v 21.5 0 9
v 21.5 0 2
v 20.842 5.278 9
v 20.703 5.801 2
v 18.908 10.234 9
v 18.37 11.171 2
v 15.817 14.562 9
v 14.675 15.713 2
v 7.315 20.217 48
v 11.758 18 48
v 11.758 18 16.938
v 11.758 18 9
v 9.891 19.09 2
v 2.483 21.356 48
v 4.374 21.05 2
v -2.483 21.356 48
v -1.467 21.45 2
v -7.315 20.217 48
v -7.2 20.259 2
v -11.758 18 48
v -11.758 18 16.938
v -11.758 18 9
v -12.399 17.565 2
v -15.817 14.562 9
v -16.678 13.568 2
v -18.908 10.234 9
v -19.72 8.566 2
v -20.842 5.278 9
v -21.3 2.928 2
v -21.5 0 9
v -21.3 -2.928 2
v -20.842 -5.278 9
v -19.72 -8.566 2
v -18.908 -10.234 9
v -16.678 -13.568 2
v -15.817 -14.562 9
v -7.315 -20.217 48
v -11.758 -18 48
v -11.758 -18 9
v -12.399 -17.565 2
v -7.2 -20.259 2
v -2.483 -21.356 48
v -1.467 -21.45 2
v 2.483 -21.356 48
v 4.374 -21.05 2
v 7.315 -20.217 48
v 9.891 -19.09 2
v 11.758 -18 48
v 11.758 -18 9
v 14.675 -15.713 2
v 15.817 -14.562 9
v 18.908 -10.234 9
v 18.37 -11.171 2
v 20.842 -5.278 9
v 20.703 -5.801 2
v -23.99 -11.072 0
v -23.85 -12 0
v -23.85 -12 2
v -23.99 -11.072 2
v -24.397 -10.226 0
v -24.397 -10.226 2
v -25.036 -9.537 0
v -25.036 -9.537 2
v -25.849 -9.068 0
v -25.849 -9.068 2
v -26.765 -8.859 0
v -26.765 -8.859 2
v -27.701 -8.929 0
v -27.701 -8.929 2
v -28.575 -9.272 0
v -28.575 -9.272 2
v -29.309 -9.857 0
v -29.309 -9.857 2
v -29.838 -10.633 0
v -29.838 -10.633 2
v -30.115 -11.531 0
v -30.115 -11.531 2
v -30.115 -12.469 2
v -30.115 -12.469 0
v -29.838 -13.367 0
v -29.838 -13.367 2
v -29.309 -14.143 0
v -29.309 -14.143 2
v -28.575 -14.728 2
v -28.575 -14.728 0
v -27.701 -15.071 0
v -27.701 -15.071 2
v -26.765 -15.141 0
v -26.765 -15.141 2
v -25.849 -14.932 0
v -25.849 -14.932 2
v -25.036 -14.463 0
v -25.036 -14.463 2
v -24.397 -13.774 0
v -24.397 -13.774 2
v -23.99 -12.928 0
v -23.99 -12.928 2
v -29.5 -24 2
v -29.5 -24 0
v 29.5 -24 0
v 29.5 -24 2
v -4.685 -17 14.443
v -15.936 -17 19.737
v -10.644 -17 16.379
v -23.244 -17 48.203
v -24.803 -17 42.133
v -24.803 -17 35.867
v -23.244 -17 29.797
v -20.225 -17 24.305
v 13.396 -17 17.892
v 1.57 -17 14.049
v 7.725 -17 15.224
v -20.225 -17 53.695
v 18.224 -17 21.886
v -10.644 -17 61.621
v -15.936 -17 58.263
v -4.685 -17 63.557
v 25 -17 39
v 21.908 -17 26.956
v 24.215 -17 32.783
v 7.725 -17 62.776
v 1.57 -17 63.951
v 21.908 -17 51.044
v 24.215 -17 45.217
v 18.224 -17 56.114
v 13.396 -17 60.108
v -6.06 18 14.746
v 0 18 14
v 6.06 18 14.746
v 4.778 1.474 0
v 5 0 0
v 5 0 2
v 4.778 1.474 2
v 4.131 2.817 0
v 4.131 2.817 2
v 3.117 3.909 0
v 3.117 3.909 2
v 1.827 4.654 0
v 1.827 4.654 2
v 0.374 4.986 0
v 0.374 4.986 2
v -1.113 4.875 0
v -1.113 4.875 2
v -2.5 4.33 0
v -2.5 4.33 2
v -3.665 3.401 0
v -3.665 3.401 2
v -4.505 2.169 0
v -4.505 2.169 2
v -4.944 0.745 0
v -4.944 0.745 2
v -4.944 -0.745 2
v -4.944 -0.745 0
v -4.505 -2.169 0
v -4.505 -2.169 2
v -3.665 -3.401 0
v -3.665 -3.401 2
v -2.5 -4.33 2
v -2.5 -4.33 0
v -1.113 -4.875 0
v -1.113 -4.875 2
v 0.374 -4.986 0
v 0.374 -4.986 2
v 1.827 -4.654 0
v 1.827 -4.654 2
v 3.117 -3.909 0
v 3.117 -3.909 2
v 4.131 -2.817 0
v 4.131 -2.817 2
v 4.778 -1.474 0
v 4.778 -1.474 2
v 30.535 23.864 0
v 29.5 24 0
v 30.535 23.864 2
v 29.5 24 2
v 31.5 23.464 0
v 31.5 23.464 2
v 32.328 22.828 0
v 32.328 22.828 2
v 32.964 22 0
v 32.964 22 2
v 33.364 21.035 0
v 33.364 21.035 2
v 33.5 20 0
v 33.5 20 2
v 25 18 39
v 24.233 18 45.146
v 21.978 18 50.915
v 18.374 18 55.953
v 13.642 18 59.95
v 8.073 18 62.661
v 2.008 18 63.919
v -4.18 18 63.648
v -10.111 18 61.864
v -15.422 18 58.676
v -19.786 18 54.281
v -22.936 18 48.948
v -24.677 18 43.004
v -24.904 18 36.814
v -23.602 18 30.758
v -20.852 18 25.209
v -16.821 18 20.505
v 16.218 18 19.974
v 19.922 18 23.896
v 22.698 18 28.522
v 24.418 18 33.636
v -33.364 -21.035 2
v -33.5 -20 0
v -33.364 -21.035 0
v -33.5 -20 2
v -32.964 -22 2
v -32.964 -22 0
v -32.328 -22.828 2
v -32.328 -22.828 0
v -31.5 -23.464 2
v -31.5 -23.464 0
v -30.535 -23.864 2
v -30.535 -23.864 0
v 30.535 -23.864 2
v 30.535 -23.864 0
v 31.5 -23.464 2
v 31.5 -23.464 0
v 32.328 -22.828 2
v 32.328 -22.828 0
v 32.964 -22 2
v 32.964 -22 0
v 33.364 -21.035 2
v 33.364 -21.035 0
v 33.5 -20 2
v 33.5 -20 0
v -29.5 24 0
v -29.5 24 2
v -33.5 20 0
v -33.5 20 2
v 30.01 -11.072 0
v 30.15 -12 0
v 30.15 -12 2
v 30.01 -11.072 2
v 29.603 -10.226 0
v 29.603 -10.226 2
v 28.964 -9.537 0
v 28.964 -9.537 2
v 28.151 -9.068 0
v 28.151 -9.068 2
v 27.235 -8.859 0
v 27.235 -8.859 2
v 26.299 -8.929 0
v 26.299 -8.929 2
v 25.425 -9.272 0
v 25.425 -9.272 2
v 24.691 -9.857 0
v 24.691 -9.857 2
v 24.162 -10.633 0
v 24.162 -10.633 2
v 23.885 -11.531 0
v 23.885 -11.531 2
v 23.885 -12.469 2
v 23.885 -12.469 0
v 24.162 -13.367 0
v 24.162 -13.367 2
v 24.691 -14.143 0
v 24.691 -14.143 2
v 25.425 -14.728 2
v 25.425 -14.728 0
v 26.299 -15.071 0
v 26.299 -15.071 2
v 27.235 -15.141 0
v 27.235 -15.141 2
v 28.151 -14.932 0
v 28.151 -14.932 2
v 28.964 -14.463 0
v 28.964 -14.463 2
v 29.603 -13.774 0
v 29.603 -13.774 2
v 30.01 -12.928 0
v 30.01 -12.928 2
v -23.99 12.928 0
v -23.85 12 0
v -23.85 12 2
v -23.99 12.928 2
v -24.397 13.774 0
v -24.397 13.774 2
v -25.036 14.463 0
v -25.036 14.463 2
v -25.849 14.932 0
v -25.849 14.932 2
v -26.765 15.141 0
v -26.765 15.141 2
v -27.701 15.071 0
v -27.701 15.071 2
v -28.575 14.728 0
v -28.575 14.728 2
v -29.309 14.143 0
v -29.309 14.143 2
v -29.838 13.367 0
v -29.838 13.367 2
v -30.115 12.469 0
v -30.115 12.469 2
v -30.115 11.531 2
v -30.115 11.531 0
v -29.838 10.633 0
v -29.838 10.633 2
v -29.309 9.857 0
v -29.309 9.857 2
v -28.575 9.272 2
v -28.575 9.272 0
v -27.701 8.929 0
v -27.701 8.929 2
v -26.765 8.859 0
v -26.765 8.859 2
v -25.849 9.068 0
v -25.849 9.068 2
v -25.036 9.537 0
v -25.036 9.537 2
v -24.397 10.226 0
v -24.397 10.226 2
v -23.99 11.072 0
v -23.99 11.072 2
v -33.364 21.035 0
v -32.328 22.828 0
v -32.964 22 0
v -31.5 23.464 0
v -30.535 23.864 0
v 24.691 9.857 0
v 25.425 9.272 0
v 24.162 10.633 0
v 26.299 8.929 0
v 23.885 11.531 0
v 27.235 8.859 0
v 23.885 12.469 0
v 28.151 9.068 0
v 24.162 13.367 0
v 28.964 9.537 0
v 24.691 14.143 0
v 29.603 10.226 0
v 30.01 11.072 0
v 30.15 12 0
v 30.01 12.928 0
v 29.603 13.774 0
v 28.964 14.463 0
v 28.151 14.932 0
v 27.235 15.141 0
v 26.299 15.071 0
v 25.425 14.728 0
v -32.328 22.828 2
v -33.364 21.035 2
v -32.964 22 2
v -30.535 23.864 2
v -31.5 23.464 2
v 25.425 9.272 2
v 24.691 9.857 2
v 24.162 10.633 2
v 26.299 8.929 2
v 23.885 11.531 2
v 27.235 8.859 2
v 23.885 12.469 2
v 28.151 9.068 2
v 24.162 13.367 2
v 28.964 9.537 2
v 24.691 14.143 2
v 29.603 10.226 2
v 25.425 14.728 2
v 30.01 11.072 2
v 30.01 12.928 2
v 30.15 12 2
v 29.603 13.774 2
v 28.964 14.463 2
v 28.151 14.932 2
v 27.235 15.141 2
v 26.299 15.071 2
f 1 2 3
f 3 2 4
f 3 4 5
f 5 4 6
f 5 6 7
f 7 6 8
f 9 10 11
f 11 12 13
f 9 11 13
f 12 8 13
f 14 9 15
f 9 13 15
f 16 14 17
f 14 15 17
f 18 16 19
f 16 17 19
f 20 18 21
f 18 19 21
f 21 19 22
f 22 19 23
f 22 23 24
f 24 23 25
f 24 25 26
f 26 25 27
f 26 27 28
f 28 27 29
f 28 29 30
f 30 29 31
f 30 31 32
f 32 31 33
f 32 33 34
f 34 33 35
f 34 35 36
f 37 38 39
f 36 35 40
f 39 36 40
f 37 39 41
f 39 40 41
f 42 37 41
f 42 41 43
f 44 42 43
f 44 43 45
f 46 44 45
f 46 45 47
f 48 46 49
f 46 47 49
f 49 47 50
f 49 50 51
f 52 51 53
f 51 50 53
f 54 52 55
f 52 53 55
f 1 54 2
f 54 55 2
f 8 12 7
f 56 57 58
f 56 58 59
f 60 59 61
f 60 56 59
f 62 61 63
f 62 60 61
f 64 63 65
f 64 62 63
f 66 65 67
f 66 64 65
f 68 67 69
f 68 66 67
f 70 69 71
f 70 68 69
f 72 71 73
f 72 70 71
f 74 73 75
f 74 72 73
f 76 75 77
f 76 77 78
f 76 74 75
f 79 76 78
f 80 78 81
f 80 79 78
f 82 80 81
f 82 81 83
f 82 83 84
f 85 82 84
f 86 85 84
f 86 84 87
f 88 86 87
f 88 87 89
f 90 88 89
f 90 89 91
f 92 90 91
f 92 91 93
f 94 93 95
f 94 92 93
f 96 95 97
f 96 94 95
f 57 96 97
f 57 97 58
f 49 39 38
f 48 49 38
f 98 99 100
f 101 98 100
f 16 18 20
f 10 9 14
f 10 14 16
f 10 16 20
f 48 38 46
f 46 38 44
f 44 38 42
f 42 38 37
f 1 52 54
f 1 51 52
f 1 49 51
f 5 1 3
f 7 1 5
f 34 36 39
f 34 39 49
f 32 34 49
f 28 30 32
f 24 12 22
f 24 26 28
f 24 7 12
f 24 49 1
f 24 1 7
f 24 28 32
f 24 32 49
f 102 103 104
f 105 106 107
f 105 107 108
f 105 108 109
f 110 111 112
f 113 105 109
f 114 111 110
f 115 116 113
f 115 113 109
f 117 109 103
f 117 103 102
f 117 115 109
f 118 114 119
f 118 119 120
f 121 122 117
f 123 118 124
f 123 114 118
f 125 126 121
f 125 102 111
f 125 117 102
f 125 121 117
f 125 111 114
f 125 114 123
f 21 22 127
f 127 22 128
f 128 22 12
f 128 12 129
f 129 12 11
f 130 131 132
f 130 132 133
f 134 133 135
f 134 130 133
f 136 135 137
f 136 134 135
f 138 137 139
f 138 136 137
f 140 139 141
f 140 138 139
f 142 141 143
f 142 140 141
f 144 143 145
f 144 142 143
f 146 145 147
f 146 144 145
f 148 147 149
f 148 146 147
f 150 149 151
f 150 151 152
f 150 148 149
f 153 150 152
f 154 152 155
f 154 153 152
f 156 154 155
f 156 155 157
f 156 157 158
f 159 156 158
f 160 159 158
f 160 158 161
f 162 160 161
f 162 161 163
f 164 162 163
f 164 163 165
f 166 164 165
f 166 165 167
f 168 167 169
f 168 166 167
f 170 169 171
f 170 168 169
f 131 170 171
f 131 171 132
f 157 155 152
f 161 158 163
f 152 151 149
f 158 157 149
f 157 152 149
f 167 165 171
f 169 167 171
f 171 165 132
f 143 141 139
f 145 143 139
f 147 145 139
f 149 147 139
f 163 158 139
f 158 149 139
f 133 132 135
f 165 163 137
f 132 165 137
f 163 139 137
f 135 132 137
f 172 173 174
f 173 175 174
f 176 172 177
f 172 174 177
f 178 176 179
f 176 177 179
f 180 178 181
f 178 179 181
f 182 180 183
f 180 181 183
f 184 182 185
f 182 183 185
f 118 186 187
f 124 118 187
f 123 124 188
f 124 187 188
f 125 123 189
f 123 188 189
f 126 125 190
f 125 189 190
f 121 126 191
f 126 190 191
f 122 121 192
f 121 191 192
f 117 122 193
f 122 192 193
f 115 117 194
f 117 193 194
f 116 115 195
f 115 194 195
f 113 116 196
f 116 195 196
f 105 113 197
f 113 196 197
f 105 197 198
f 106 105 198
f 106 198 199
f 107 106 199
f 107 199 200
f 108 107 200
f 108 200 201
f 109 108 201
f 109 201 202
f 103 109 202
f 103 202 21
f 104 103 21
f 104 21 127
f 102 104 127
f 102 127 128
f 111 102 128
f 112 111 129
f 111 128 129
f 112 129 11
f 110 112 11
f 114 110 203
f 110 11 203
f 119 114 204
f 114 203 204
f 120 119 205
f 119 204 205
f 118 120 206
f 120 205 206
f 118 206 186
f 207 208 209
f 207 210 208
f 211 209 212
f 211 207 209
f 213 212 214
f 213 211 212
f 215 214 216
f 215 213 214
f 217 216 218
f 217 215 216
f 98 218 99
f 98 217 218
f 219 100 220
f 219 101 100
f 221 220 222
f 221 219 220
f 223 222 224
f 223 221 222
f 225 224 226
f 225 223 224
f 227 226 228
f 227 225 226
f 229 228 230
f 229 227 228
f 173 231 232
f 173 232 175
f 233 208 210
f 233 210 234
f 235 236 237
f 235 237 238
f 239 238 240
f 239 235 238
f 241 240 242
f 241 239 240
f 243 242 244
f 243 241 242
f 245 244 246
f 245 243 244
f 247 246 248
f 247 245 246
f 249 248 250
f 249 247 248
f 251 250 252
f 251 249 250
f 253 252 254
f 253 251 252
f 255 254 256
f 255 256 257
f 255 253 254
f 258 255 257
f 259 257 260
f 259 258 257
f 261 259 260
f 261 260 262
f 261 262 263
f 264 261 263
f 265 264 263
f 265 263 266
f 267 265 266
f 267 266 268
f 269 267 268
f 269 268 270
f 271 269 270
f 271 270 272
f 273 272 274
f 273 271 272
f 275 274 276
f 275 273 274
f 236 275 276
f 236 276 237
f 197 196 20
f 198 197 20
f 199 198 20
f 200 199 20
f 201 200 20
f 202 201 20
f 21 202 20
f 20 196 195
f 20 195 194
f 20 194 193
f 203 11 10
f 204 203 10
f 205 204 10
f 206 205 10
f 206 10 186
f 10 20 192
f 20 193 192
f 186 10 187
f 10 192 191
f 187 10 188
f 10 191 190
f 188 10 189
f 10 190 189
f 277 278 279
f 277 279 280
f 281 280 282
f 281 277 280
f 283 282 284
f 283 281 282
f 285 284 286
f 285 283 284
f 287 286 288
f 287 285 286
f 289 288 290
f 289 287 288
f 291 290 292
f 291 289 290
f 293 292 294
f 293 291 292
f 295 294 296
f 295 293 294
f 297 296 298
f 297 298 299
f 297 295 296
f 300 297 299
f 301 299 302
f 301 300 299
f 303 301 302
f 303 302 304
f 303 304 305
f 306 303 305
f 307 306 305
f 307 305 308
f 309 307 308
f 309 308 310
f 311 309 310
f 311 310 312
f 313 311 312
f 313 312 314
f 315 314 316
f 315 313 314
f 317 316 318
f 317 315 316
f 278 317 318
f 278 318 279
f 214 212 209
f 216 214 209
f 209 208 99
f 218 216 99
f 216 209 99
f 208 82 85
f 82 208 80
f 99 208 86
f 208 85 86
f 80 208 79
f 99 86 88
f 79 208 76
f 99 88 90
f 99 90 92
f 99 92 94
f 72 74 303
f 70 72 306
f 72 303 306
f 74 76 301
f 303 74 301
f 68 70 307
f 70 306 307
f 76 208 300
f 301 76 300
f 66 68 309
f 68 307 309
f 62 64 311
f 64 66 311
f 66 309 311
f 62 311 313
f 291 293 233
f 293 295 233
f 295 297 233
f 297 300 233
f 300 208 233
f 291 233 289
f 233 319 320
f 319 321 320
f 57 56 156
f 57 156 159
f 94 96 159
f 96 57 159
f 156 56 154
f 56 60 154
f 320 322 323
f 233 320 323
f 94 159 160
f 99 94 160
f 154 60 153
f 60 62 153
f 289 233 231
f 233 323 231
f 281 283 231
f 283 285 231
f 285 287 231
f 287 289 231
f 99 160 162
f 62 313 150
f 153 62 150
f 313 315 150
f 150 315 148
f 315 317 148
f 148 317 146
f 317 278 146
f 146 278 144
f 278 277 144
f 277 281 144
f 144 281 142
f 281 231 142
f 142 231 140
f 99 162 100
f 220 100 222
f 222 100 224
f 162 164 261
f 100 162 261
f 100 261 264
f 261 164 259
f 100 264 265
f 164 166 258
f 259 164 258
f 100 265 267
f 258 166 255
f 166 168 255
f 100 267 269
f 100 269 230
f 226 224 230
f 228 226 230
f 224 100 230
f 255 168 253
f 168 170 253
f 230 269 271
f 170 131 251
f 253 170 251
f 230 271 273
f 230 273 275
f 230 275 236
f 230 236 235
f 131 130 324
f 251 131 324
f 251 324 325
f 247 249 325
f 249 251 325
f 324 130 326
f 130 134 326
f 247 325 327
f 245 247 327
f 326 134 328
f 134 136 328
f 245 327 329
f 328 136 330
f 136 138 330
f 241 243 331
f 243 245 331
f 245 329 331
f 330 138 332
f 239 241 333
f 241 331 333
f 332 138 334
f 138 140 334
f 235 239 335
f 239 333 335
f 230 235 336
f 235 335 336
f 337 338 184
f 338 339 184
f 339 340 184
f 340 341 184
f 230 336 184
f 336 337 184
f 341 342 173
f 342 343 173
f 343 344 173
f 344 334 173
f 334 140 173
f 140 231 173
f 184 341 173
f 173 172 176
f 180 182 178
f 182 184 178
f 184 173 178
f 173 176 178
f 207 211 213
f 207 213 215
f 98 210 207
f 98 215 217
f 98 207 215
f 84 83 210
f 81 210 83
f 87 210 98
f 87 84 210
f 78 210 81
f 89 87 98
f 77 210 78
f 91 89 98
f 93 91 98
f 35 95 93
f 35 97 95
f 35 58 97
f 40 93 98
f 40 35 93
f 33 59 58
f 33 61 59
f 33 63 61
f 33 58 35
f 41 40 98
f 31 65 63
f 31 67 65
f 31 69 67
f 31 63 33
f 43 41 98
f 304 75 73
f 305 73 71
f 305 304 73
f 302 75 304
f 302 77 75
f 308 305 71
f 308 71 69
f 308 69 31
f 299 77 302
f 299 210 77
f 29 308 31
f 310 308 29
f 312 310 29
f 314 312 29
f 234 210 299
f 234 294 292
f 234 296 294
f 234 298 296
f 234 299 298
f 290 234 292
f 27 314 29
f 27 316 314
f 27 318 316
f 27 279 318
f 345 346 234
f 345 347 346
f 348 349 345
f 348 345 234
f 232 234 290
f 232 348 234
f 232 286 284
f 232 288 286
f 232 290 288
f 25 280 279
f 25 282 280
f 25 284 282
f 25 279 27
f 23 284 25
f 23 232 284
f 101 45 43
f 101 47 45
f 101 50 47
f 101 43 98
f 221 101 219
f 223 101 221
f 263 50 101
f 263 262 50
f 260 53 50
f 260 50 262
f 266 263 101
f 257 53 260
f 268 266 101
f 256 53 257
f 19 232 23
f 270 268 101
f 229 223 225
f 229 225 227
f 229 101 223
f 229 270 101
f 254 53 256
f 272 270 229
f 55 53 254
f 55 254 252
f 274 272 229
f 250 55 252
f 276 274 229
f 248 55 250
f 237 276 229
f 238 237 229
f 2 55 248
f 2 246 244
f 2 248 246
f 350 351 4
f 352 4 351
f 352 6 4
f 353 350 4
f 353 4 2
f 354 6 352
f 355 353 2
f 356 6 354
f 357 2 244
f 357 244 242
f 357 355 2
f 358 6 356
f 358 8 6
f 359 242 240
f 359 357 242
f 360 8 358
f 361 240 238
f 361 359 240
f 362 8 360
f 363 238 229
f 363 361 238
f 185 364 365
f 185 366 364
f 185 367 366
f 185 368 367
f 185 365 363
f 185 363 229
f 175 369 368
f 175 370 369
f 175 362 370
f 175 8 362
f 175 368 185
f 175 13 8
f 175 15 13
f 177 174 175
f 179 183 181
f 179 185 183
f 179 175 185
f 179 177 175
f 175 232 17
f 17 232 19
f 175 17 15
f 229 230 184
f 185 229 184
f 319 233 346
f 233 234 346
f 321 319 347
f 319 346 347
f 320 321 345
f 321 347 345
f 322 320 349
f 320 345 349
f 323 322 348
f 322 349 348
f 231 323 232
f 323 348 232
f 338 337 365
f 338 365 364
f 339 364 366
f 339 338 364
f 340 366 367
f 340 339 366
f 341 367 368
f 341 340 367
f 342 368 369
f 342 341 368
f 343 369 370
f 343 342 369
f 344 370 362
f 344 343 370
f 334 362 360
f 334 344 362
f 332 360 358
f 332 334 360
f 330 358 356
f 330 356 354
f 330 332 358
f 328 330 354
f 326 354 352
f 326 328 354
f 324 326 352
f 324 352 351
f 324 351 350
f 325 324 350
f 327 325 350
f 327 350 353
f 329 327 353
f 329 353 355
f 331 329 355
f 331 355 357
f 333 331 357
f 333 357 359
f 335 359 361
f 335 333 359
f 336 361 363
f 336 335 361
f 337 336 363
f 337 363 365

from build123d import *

# Parameters (mm, degrees)
SKETCH_W          = 67
SKETCH_H          = 48
SKETCH_R          = 3.15
SKETCH_R_2        = 5
PAD_DEPTH         = 2
FILLET_R          = 4
SKETCH001_R       = 21.5
PAD001_DEPTH      = 46
SKETCH002_W       = 36
SKETCH002_H       = 39
POCKET_DEPTH      = 33.501
POCKET_DEPTH_BACK = -33.501
SKETCH003_R       = 25
PAD002_DEPTH      = 35


with BuildPart() as part:
    # Sketch → Pad (new body)
    with BuildSketch(Plane.XY):
        Rectangle(SKETCH_W, SKETCH_H)
        with Locations((-27, 12)):
            Circle(SKETCH_R, mode=Mode.SUBTRACT)
        with Locations((27, -12)):
            Circle(SKETCH_R, mode=Mode.SUBTRACT)
        with Locations((27, 12)):
            Circle(SKETCH_R, mode=Mode.SUBTRACT)
        with Locations((-27, -12)):
            Circle(SKETCH_R, mode=Mode.SUBTRACT)
        Circle(SKETCH_R_2, mode=Mode.SUBTRACT)
    extrude(amount=PAD_DEPTH)

    # Fillet
    fillet_edges = [part.edges().sort_by_distance(p)[0] for p in [
        (-33.5, -24, 1),
        (33.5, -24, 1),
        (33.5, 24, 1),
        (-33.5, 24, 1),
    ]]
    fillet(fillet_edges, radius=FILLET_R)

    # Sketch001 (on Face5 of Fillet) → Pad001 (join)
    with BuildSketch(Plane.XY.offset(2)):
        Circle(SKETCH001_R)
    extrude(amount=PAD001_DEPTH)

    # Sketch002 → Pocket (cut, two sides)
    with BuildSketch(Plane.YZ) as pocket_sk:
        with Locations((0, 28.5)):
            Rectangle(SKETCH002_W, SKETCH002_H)
    extrude(amount=-POCKET_DEPTH, mode=Mode.SUBTRACT)
    extrude(pocket_sk.sketch, amount=-POCKET_DEPTH_BACK, mode=Mode.SUBTRACT)

    # Sketch003 (on Face21 of Pocket) → Pad002 (join)
    with BuildSketch(Plane.XZ.offset(-18)):
        with Locations((0, 39)):
            Circle(SKETCH003_R)
    extrude(amount=PAD002_DEPTH)


solid = part.part
